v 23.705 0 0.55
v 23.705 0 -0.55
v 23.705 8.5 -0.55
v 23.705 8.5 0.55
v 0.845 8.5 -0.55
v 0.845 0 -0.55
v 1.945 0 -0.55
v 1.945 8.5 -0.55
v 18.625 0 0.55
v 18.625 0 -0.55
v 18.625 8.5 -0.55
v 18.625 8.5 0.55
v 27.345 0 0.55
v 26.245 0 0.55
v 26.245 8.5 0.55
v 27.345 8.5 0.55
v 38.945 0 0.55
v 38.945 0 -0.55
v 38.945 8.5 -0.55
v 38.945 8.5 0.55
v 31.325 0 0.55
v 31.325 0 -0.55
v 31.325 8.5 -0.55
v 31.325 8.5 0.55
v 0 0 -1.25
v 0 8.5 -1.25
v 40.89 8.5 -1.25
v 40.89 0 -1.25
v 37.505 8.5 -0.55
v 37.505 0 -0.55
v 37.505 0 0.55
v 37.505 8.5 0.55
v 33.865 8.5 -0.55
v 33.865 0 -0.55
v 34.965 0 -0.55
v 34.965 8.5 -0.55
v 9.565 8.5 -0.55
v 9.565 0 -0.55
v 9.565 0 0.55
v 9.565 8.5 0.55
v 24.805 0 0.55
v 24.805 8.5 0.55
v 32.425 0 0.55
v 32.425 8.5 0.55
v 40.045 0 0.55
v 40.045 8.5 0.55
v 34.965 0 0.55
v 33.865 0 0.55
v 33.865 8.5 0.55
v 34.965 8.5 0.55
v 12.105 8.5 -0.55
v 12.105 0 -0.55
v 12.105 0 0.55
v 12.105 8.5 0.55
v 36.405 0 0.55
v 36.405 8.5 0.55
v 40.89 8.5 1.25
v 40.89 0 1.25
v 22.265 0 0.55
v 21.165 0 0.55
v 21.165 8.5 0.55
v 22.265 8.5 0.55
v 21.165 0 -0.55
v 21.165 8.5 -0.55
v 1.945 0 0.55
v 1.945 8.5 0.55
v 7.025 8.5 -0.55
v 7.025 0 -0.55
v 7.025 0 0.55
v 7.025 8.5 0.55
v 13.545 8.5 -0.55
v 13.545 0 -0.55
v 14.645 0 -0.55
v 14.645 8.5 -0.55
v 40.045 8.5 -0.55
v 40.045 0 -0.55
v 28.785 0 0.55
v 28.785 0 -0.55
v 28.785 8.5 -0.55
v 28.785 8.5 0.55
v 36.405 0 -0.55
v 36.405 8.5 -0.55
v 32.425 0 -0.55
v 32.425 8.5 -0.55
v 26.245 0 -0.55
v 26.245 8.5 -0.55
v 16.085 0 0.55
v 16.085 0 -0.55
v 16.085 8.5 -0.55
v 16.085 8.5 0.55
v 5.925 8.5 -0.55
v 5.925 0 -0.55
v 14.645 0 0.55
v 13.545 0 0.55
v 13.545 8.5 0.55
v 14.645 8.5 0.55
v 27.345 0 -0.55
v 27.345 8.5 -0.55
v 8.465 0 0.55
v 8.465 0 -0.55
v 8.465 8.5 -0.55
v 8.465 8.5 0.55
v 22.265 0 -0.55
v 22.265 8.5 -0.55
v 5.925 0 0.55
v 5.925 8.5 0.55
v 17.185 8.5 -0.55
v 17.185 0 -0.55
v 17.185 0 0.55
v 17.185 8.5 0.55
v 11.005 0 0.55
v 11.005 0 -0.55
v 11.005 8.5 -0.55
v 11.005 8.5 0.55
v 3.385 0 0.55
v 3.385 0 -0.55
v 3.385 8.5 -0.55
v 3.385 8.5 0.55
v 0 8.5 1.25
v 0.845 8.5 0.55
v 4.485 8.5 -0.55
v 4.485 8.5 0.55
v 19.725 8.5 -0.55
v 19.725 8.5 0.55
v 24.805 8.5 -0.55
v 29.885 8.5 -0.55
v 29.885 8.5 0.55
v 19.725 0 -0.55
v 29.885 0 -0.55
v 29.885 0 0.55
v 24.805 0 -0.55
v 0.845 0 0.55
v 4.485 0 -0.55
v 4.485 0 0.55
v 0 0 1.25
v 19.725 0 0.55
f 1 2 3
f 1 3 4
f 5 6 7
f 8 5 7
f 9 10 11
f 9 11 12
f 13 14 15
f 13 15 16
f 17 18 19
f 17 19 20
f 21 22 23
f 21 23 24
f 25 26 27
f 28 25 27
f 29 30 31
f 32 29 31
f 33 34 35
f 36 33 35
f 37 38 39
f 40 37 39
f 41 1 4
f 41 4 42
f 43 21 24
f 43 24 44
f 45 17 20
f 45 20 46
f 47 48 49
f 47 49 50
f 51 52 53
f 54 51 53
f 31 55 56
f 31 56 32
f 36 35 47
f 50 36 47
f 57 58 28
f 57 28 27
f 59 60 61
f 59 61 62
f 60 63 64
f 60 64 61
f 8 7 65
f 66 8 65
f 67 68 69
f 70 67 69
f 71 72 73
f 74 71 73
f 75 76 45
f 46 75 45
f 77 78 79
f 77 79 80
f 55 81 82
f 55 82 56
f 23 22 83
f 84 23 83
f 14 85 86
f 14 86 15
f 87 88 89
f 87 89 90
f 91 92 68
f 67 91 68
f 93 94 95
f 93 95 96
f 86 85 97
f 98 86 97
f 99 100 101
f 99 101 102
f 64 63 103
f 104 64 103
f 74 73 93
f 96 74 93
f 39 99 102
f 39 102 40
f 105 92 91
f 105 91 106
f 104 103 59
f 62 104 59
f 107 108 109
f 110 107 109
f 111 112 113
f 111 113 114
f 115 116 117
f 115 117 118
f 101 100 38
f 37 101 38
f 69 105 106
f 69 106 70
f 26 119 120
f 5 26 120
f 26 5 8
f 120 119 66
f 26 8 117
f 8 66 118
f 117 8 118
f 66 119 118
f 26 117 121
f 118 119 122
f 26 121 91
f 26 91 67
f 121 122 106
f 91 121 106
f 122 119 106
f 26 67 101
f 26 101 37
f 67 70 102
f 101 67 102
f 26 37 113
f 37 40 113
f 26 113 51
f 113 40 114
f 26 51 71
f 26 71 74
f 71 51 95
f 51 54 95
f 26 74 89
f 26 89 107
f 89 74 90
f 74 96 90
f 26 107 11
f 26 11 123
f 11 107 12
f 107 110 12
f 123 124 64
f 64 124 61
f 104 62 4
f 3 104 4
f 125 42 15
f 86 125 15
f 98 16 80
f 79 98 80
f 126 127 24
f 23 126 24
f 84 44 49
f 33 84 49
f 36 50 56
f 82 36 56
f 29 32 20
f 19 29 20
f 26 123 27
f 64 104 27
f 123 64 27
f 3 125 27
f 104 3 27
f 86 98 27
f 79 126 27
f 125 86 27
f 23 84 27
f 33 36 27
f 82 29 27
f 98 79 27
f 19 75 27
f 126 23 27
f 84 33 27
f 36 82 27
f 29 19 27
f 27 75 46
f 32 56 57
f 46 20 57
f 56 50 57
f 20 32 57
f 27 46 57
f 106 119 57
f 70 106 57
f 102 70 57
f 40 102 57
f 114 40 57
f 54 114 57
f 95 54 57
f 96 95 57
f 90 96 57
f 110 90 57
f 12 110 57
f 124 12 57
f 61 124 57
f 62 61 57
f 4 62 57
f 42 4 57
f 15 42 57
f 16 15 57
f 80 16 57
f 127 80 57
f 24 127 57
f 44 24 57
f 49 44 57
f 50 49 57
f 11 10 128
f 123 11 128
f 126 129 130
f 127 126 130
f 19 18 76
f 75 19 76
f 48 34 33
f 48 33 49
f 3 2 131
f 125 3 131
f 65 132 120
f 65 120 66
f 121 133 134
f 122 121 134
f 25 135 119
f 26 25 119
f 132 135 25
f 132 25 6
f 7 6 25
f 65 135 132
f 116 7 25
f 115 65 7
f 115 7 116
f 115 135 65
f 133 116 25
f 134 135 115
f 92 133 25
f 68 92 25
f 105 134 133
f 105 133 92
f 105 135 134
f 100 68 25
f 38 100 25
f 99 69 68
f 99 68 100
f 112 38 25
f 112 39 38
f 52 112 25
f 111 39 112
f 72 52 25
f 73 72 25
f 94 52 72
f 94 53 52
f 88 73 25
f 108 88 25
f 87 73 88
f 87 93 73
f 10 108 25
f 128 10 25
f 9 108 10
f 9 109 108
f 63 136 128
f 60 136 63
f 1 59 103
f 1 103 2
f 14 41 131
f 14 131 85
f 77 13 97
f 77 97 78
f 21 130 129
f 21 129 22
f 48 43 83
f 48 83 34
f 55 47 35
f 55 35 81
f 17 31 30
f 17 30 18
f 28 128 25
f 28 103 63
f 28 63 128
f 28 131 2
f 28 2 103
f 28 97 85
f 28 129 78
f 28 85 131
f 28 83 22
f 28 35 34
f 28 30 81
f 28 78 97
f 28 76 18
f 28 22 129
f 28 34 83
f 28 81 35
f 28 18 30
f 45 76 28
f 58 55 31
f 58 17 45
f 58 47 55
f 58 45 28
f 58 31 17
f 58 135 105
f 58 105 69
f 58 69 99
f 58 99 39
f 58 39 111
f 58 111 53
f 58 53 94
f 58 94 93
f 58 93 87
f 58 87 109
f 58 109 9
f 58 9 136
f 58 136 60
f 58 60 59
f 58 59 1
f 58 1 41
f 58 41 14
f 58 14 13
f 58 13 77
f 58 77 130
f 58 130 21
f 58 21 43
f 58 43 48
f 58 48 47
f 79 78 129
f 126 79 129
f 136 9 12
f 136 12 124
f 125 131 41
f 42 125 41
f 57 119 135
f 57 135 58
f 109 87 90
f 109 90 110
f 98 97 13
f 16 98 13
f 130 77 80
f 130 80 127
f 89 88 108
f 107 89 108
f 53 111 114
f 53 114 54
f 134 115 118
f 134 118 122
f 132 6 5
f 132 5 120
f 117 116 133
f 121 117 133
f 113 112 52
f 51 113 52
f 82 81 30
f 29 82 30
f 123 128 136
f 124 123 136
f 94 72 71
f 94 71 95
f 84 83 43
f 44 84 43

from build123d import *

# Parameters (mm, degrees)
SKETCH1_W           = 40.89
SKETCH1_H           = 8.5
BOSS_EXTRUDE1_DEPTH = 1.25
SKETCH2_W           = 1.1
SKETCH2_H           = 1.1
CUT_EXTRUDE1_DEPTH  = 42.782826616


with BuildPart() as part:
    # Sketch1 → Boss-Extrude1 (new, symmetric)
    with BuildSketch(Plane.XY):
        with Locations((20.445, 4.25)):
            Rectangle(SKETCH1_W, SKETCH1_H)
    extrude(amount=BOSS_EXTRUDE1_DEPTH, both=True)

    # Sketch2 → Cut-Extrude1 (cut, through all)
    with BuildSketch(Plane.XZ):
        with Locations((3.935, 0)):
            Rectangle(SKETCH2_W, SKETCH2_H)
        with Locations((1.395, 0)):
            Rectangle(SKETCH2_W, SKETCH2_H)
        with Locations((6.475, 0)):
            Rectangle(SKETCH2_W, SKETCH2_H)
        with Locations((9.015, 0)):
            Rectangle(SKETCH2_W, SKETCH2_H)
        with Locations((11.555, 0)):
            Rectangle(SKETCH2_W, SKETCH2_H)
        with Locations((14.095, 0)):
            Rectangle(SKETCH2_W, SKETCH2_H)
        with Locations((16.635, 0)):
            Rectangle(SKETCH2_W, SKETCH2_H)
        with Locations((19.175, 0)):
            Rectangle(SKETCH2_W, SKETCH2_H)
        with Locations((21.715, 0)):
            Rectangle(SKETCH2_W, SKETCH2_H)
        with Locations((24.255, 0)):
            Rectangle(SKETCH2_W, SKETCH2_H)
        with Locations((26.795, 0)):
            Rectangle(SKETCH2_W, SKETCH2_H)
        with Locations((29.335, 0)):
            Rectangle(SKETCH2_W, SKETCH2_H)
        with Locations((31.875, 0)):
            Rectangle(SKETCH2_W, SKETCH2_H)
        with Locations((34.415, 0)):
            Rectangle(SKETCH2_W, SKETCH2_H)
        with Locations((36.955, 0)):
            Rectangle(SKETCH2_W, SKETCH2_H)
        with Locations((39.495, 0)):
            Rectangle(SKETCH2_W, SKETCH2_H)
    extrude(amount=-CUT_EXTRUDE1_DEPTH, mode=Mode.SUBTRACT)


solid = part.part
